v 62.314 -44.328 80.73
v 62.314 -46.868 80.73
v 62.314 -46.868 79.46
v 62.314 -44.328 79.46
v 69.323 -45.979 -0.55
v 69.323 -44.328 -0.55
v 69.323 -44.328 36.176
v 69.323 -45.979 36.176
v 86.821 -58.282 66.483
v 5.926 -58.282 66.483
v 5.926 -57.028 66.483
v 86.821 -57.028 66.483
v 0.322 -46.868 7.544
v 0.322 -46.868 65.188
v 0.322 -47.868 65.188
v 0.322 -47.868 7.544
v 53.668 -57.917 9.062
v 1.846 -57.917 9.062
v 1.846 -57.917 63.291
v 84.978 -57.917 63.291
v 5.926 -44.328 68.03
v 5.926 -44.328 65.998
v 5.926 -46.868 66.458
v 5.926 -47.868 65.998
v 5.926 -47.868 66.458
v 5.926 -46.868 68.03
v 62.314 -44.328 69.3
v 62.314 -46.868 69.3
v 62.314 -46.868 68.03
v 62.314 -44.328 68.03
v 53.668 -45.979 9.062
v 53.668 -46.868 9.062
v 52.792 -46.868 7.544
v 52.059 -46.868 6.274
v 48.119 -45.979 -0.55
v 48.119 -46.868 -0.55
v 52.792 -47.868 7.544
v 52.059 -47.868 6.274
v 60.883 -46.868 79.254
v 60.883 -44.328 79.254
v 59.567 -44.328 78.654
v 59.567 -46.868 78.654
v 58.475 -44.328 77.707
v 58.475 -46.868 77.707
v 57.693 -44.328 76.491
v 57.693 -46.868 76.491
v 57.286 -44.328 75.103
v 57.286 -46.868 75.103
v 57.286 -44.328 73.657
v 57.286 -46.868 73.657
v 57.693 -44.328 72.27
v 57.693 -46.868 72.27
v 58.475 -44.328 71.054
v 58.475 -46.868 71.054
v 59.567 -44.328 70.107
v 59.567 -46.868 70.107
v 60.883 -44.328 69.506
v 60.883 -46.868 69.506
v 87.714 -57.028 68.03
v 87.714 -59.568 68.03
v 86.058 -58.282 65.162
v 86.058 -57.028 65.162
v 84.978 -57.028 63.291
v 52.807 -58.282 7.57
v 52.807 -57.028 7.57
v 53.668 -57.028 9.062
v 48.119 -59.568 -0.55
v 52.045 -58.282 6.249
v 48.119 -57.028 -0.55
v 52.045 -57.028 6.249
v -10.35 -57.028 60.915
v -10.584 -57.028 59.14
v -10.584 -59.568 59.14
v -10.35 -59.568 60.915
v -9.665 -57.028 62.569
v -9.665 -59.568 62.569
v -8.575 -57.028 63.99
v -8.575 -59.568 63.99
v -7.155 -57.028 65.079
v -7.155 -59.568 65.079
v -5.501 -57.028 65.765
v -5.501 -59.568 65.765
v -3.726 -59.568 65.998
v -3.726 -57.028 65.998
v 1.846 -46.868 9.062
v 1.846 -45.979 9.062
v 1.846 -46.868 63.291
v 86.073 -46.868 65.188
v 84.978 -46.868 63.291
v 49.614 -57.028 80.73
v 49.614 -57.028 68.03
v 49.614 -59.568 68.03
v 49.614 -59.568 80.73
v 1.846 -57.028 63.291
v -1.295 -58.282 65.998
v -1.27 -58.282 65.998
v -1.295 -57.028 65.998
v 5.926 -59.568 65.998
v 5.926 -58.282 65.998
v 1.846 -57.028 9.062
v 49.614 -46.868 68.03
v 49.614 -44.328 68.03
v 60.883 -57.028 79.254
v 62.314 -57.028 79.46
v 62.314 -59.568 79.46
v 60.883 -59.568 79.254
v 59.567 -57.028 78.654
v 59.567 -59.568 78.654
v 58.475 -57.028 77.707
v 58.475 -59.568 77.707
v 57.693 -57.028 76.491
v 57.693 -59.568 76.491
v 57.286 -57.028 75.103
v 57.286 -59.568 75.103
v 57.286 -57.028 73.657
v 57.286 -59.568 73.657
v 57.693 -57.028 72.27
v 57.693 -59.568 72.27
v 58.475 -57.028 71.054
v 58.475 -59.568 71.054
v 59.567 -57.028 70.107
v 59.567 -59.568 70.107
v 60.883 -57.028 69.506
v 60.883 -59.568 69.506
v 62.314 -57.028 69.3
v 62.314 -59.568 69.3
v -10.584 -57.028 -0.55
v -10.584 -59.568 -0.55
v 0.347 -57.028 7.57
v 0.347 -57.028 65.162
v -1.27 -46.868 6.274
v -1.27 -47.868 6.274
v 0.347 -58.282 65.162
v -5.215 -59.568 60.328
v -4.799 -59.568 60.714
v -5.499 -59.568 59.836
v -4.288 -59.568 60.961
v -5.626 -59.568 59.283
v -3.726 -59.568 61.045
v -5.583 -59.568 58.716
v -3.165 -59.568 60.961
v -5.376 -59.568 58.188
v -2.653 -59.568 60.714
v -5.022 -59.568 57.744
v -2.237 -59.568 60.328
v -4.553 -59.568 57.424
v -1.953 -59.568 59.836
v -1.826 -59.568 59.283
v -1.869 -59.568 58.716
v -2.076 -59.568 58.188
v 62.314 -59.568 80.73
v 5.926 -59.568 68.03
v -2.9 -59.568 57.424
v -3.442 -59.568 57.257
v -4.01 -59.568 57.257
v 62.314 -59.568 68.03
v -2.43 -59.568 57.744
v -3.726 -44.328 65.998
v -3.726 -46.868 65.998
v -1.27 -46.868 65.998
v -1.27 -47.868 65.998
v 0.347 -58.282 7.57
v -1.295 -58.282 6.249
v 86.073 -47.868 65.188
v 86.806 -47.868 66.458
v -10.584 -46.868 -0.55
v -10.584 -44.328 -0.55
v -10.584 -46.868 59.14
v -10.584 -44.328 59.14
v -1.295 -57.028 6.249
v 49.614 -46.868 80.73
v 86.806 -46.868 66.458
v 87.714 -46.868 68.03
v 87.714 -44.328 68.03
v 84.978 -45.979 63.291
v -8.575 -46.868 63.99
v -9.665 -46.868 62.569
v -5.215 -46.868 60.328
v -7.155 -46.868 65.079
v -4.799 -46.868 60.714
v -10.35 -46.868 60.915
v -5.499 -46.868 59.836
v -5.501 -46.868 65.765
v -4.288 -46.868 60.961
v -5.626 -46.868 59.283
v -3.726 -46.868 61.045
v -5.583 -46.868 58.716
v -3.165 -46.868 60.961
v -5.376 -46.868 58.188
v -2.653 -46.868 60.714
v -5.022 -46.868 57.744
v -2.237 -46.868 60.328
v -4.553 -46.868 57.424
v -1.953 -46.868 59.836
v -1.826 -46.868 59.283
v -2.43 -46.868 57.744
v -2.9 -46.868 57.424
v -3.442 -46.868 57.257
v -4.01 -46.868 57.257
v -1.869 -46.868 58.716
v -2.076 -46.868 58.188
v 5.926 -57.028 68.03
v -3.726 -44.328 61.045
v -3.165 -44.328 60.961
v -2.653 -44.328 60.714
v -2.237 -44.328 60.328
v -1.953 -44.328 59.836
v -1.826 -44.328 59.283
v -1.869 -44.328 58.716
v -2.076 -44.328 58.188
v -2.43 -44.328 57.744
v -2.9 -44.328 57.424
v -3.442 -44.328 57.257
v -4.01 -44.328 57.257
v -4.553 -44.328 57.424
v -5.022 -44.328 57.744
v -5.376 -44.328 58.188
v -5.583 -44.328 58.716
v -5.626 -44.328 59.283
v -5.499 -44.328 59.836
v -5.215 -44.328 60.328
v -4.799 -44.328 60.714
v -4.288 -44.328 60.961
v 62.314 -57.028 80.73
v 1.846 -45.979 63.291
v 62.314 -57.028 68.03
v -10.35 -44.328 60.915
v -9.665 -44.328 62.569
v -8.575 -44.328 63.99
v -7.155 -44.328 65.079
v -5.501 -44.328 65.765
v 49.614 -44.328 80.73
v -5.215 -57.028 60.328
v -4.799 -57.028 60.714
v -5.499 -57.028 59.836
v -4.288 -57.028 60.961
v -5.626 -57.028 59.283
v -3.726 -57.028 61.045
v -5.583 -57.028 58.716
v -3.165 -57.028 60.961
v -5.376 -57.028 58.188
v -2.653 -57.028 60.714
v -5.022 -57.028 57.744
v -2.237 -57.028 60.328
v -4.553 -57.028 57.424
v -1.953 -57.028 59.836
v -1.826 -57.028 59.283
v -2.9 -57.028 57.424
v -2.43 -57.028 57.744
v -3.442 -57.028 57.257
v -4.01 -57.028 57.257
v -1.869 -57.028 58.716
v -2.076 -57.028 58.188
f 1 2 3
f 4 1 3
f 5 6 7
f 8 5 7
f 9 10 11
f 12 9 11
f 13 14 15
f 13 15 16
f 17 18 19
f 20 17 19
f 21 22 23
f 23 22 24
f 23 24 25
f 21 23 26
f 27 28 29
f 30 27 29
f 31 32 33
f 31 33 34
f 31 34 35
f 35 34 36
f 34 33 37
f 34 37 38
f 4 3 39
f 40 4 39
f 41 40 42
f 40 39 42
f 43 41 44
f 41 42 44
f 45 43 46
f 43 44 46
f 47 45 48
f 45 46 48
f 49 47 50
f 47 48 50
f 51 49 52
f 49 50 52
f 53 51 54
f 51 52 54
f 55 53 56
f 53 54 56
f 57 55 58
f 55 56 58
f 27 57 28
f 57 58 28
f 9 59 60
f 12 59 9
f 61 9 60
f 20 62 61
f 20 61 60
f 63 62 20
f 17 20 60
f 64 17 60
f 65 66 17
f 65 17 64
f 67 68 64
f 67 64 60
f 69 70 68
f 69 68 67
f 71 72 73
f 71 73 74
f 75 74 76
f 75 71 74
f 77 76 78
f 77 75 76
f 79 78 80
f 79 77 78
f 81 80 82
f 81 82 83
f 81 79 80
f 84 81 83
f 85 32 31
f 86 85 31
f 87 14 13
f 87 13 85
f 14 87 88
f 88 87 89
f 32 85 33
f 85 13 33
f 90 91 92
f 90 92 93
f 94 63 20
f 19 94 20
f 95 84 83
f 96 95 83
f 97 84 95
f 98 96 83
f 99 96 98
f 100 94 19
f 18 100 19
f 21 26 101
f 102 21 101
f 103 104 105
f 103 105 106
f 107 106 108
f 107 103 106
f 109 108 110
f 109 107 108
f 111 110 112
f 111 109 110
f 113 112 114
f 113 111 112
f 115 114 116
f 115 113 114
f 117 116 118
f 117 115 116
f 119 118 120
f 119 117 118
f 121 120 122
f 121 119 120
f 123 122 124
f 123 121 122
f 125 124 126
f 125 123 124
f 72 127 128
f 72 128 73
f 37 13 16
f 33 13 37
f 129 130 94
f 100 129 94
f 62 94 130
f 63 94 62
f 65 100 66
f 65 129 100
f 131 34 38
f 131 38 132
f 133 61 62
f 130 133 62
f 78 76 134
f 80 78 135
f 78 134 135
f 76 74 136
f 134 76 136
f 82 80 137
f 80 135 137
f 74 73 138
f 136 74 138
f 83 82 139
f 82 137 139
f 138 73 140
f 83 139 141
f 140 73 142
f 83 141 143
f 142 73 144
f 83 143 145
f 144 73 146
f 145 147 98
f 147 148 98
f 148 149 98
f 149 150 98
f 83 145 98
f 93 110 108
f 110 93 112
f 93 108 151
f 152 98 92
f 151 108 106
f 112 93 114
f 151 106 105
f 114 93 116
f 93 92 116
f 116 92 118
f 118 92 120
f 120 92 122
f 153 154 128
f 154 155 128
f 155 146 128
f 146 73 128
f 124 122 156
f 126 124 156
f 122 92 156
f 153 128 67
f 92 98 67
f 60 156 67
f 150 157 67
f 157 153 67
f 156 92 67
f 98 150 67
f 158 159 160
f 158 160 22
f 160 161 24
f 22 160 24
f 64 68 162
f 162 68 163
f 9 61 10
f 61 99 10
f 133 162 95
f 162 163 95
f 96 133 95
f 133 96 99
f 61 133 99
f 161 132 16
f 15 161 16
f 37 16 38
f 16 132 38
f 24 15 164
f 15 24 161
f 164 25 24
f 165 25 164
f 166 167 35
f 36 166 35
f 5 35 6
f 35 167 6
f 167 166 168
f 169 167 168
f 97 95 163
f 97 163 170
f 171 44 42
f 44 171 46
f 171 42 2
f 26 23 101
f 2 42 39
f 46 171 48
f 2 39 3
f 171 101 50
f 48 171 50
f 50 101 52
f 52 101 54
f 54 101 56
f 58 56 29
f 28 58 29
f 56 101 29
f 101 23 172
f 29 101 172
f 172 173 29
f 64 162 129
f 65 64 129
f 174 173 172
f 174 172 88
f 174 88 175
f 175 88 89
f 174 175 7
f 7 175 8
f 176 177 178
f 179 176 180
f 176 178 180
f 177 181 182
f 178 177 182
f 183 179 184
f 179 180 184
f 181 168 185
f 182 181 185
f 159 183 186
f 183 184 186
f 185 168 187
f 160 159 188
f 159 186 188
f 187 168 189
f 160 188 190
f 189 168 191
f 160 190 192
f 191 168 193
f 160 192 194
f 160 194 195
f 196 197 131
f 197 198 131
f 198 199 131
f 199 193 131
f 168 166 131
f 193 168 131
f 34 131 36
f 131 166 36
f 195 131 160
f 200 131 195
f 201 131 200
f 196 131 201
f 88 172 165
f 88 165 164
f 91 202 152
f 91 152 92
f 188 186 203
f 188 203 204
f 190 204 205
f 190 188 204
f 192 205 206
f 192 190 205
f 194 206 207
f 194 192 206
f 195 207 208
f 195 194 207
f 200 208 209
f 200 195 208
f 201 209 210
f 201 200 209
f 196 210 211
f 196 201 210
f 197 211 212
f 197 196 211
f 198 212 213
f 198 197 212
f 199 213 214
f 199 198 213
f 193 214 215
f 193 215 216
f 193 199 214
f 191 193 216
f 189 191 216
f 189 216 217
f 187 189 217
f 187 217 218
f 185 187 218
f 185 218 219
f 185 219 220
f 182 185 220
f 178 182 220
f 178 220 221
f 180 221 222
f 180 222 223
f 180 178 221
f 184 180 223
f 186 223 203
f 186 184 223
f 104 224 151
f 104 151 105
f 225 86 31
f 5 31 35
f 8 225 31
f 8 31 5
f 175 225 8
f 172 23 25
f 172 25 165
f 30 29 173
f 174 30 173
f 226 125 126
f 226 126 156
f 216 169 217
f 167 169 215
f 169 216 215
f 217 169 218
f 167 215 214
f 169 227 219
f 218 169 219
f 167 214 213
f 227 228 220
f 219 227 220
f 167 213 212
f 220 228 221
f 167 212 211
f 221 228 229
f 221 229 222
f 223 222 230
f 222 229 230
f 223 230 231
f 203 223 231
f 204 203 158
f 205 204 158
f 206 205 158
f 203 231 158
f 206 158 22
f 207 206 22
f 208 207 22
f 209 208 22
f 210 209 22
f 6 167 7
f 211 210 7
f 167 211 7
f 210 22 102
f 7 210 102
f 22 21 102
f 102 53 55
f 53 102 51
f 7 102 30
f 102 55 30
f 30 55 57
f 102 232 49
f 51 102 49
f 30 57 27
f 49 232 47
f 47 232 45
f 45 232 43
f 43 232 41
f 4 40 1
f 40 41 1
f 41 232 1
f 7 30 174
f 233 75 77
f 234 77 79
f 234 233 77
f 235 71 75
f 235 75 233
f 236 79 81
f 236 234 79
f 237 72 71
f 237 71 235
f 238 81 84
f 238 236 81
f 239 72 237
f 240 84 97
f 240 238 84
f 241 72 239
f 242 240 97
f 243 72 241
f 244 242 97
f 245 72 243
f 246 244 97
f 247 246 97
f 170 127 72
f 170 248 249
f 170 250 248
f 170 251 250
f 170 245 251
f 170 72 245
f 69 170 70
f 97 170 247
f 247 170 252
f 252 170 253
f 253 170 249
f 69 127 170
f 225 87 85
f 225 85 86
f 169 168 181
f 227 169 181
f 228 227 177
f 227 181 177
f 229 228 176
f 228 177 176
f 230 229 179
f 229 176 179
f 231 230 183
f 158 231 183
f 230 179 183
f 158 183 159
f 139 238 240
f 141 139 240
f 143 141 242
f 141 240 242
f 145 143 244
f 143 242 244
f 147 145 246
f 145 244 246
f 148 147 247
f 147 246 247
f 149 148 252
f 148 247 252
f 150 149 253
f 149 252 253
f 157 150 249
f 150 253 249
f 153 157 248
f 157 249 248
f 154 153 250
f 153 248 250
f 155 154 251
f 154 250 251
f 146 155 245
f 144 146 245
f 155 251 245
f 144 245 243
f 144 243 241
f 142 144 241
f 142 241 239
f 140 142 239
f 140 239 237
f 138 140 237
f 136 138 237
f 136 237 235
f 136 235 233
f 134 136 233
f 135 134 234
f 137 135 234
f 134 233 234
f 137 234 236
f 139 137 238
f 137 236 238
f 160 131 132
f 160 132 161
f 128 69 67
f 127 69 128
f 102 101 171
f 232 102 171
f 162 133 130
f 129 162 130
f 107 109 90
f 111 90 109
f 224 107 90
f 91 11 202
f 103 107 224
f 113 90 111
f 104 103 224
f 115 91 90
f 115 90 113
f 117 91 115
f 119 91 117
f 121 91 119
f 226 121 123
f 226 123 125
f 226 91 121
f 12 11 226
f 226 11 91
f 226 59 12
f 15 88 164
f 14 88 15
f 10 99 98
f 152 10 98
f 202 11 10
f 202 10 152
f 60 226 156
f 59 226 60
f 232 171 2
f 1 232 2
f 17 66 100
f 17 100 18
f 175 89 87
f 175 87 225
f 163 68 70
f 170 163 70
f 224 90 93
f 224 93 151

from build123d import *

# Parameters (mm, degrees)
STANDARD_START                 = 1.845946354
STANDARD_CREDIT_CARD_OUTLINE_W = 0.79375
STANDARD_CREDIT_CARD_OUTLINE_H = 53.975
STANDARD_CREDIT_CARD_DEPTH     = 85.598
MOVE_START                     = 1.845946354
MOVE_FACE1_OUTLINE_W           = 1.04775
MOVE_FACE1_OUTLINE_H           = 54.229
MOVE_FACE1_DEPTH               = 85.725
BOSS_EXTRUDE2_START            = -0.889
SKETCH1_R                      = 1.905
BOSS_EXTRUDE2_DEPTH            = 2.54
BOSS_EXTRUDE3_DEPTH            = 1
SKETCH7_W                      = 6.35
SKETCH7_H                      = 2.032
CUT_EXTRUDE2_DEPTH             = 120.262889651
CUT_EXTRUDE1_DEPTH             = 2
MOVE_START_2                   = -1.27
MOVE_FACE4_OUTLINE_W           = 0.254
MOVE_FACE4_OUTLINE_H           = 1.27
MOVE_FACE4_DEPTH               = 88.075975799
MOVE_FACE4_2_OUTLINE_W         = 0.254
MOVE_FACE4_2_OUTLINE_H         = 57.643162038
MOVE_FACE4_2_DEPTH             = 1.591946354
MOVE_START_3                   = -1.2954
MOVE_FACE5_OUTLINE_W           = 1.254
MOVE_FACE5_OUTLINE_H           = 1.3208
MOVE_FACE5_OUTLINE_H_2         = 0.0254
MOVE_FACE5_OUTLINE_H_3         = 0.836009737
MOVE_FACE5_DEPTH               = 88.116040496
MOVE_FACE5_2_OUTLINE_W         = 1.254
MOVE_FACE5_2_OUTLINE_H         = 57.592362038
MOVE_FACE5_2_DEPTH             = 1.642746354
BOSS_EXTRUDE5_DEPTH            = 1.651


# Read off the part's stored shape, not the designer's step: Standard Credit Card, Move Face1, Move Face4, Move Face5
with BuildPart() as part:
    # Standard Credit Card outline → Standard Credit Card (new body)
    with BuildSketch(Plane.YZ.offset(STANDARD_START)):
        with Locations((-56.663058778, 36.176138951)):
            Rectangle(STANDARD_CREDIT_CARD_OUTLINE_W, STANDARD_CREDIT_CARD_OUTLINE_H)
    extrude(amount=STANDARD_CREDIT_CARD_DEPTH)

    # Move Face1 outline → Move Face1 (add)
    with BuildSketch(Plane.YZ.offset(MOVE_START)):
        with Locations((-56.663058778, 36.176138951)):
            Rectangle(MOVE_FACE1_OUTLINE_W, MOVE_FACE1_OUTLINE_H)
    extrude(amount=MOVE_FACE1_DEPTH)


with BuildPart() as body_2:
    # Sketch1 → Boss-Extrude2 (new body)
    with BuildSketch(Plane(origin=(0, -56.139183778, 0), x_dir=(1, 0, 0), z_dir=(0, 1, 0)).offset(BOSS_EXTRUDE2_START)):
        with BuildLine():
            Line((35.050395743, 0.549751296), (-10.584077546, 0.549751296))
            Line((-10.584077546, 0.549751296), (-10.584077546, -59.140248704))
            ThreePointArc((-10.584077546, -59.140248704), (-8.575415852, -63.989587009), (-3.726077546, -65.998248704))
            Line((-3.726077546, -65.998248704), (-0.424077546, -65.998248704))
            Line((-0.424077546, -65.998248704), (-0.424077546, -68.030248704))
            Line((-0.424077546, -68.030248704), (49.613922454, -68.030248704))
            Line((49.613922454, -68.030248704), (49.613922454, -80.730248704))
            Line((49.613922454, -80.730248704), (62.313922454, -80.730248704))
            Line((62.313922454, -80.730248704), (62.313922454, -79.460248704))
            ThreePointArc((62.313922454, -79.460248704), (57.233922454, -74.380248704), (62.313922454, -69.300248704))
            Line((62.313922454, -69.300248704), (62.313922454, -68.030248704))
            Line((62.313922454, -68.030248704), (87.713922454, -68.030248704))
            Line((87.713922454, -68.030248704), (48.119240993, 0.549751296))
            Line((48.119240993, 0.549751296), (35.050395743, 0.549751296))
        make_face()
        with Locations(Location((-3.726077546, -59.140248704, 0), (0, 0, 270))):
            Circle(SKETCH1_R, mode=Mode.SUBTRACT)
    extrude(amount=BOSS_EXTRUDE2_DEPTH)

    # Combine1: cut part
    add(part.part, mode=Mode.SUBTRACT)

    # Sketch4 → Boss-Extrude3 (add)
    with BuildSketch(Plane(origin=(0, -57.028183778, 0), x_dir=(1, 0, 0), z_dir=(0, 1, 0))):
        Polygon((86.805975799, -66.457638967), (86.072740957, -65.187638967), (86.047441301, -65.187638967), (0.321946354, -65.187638967), (0.321946354, -7.544476929), (52.792445837, -7.544476929), (52.059210995, -6.274476929), (-1.27, -6.274476929), (-1.27, -65.998248704), (-0.424077546, -65.998248704), (-0.424077546, -66.457638967), align=None)
    extrude(amount=-BOSS_EXTRUDE3_DEPTH)

    # Sketch7 → Cut-Extrude2 (cut, through all)
    with BuildSketch(Plane.XZ.offset(58.028183778)):
        with Locations((2.750922454, 67.014248704)):
            Rectangle(SKETCH7_W, SKETCH7_H)
    extrude(amount=-CUT_EXTRUDE2_DEPTH, mode=Mode.SUBTRACT)


with BuildPart() as body_2_2:
    # Mirror1: mirrored copy
    add(body_2.part.mirror(Plane(origin=(-3.726077546, -57.028183778, 59.140248704), x_dir=(0, 0, 1), z_dir=(0, 1, 0))))

    # Sketch5 → Cut-Extrude1 (cut)
    with BuildSketch(Plane(origin=(0, -56.028183778, 0), x_dir=(1, 0, 0), z_dir=(0, 1, 0))):
        Polygon((86.072740957, -65.187638967), (1.357962756, -65.187638967), (0.321946354, -65.187638967), (0.321946354, -63.9570649), (0.321946354, -7.544476929), (52.792445837, -7.544476929), (52.059210995, -6.274476929), (-1.27, -6.274476929), (-1.27, -63.9570649), (-1.27, -65.998248704), (-0.424077546, -65.998248704), (-0.424077546, -66.457638967), (1.357962756, -66.457638967), (86.805975799, -66.457638967), align=None)
    extrude(amount=-CUT_EXTRUDE1_DEPTH, mode=Mode.SUBTRACT)

    # Move Face4 outline → Move Face4 (cut)
    with BuildSketch(Plane.YZ.offset(MOVE_START_2)):
        with Locations((-58.155183778, 6.909476929)):
            Rectangle(MOVE_FACE4_OUTLINE_W, MOVE_FACE4_OUTLINE_H)
        with Locations((-58.155183778, 65.822638967)):
            Rectangle(MOVE_FACE4_OUTLINE_W, MOVE_FACE4_OUTLINE_H)
    extrude(amount=MOVE_FACE4_DEPTH, mode=Mode.SUBTRACT)

    # Move Face4 2 outline → Move Face4 2 (cut)
    with BuildSketch(Plane.YZ.offset(MOVE_START_2)):
        with Locations((-58.155183778, 36.366057948)):
            Rectangle(MOVE_FACE4_2_OUTLINE_W, MOVE_FACE4_2_OUTLINE_H)
    extrude(amount=MOVE_FACE4_2_DEPTH, mode=Mode.SUBTRACT)

    # Move Face5 outline → Move Face5 (cut)
    with BuildSketch(Plane.YZ.offset(MOVE_START_3)):
        with Locations((-57.655183778, 6.909476929)):
            Rectangle(MOVE_FACE5_OUTLINE_W, MOVE_FACE5_OUTLINE_H)
        with Locations((-57.655183778, 66.470338967)):
            Rectangle(MOVE_FACE5_OUTLINE_W, MOVE_FACE5_OUTLINE_H_2)
        with Locations((-57.655183778, 65.580243835)):
            Rectangle(MOVE_FACE5_OUTLINE_W, MOVE_FACE5_OUTLINE_H_3)
    extrude(amount=MOVE_FACE5_DEPTH, mode=Mode.SUBTRACT)

    # Move Face5 2 outline → Move Face5 2 (cut)
    with BuildSketch(Plane.YZ.offset(MOVE_START_3)):
        with Locations((-57.655183778, 36.366057948)):
            Rectangle(MOVE_FACE5_2_OUTLINE_W, MOVE_FACE5_2_OUTLINE_H)
    extrude(amount=MOVE_FACE5_2_DEPTH, mode=Mode.SUBTRACT)


with BuildPart() as body_2_1:
    # Body-Move/Copy1: moved
    add(body_2.part.moved(Location((0, 10.16, 0))))

    # Sketch8 → Boss-Extrude5 (add)
    with BuildSketch(Plane.XZ.offset(44.328183778)):
        Polygon((48.119240993, -0.549751296), (69.322943613, -0.549751296), (69.322943613, 36.176138951), align=None)
    extrude(amount=BOSS_EXTRUDE5_DEPTH)


solid = Compound([body_2_2.part, body_2_1.part])
